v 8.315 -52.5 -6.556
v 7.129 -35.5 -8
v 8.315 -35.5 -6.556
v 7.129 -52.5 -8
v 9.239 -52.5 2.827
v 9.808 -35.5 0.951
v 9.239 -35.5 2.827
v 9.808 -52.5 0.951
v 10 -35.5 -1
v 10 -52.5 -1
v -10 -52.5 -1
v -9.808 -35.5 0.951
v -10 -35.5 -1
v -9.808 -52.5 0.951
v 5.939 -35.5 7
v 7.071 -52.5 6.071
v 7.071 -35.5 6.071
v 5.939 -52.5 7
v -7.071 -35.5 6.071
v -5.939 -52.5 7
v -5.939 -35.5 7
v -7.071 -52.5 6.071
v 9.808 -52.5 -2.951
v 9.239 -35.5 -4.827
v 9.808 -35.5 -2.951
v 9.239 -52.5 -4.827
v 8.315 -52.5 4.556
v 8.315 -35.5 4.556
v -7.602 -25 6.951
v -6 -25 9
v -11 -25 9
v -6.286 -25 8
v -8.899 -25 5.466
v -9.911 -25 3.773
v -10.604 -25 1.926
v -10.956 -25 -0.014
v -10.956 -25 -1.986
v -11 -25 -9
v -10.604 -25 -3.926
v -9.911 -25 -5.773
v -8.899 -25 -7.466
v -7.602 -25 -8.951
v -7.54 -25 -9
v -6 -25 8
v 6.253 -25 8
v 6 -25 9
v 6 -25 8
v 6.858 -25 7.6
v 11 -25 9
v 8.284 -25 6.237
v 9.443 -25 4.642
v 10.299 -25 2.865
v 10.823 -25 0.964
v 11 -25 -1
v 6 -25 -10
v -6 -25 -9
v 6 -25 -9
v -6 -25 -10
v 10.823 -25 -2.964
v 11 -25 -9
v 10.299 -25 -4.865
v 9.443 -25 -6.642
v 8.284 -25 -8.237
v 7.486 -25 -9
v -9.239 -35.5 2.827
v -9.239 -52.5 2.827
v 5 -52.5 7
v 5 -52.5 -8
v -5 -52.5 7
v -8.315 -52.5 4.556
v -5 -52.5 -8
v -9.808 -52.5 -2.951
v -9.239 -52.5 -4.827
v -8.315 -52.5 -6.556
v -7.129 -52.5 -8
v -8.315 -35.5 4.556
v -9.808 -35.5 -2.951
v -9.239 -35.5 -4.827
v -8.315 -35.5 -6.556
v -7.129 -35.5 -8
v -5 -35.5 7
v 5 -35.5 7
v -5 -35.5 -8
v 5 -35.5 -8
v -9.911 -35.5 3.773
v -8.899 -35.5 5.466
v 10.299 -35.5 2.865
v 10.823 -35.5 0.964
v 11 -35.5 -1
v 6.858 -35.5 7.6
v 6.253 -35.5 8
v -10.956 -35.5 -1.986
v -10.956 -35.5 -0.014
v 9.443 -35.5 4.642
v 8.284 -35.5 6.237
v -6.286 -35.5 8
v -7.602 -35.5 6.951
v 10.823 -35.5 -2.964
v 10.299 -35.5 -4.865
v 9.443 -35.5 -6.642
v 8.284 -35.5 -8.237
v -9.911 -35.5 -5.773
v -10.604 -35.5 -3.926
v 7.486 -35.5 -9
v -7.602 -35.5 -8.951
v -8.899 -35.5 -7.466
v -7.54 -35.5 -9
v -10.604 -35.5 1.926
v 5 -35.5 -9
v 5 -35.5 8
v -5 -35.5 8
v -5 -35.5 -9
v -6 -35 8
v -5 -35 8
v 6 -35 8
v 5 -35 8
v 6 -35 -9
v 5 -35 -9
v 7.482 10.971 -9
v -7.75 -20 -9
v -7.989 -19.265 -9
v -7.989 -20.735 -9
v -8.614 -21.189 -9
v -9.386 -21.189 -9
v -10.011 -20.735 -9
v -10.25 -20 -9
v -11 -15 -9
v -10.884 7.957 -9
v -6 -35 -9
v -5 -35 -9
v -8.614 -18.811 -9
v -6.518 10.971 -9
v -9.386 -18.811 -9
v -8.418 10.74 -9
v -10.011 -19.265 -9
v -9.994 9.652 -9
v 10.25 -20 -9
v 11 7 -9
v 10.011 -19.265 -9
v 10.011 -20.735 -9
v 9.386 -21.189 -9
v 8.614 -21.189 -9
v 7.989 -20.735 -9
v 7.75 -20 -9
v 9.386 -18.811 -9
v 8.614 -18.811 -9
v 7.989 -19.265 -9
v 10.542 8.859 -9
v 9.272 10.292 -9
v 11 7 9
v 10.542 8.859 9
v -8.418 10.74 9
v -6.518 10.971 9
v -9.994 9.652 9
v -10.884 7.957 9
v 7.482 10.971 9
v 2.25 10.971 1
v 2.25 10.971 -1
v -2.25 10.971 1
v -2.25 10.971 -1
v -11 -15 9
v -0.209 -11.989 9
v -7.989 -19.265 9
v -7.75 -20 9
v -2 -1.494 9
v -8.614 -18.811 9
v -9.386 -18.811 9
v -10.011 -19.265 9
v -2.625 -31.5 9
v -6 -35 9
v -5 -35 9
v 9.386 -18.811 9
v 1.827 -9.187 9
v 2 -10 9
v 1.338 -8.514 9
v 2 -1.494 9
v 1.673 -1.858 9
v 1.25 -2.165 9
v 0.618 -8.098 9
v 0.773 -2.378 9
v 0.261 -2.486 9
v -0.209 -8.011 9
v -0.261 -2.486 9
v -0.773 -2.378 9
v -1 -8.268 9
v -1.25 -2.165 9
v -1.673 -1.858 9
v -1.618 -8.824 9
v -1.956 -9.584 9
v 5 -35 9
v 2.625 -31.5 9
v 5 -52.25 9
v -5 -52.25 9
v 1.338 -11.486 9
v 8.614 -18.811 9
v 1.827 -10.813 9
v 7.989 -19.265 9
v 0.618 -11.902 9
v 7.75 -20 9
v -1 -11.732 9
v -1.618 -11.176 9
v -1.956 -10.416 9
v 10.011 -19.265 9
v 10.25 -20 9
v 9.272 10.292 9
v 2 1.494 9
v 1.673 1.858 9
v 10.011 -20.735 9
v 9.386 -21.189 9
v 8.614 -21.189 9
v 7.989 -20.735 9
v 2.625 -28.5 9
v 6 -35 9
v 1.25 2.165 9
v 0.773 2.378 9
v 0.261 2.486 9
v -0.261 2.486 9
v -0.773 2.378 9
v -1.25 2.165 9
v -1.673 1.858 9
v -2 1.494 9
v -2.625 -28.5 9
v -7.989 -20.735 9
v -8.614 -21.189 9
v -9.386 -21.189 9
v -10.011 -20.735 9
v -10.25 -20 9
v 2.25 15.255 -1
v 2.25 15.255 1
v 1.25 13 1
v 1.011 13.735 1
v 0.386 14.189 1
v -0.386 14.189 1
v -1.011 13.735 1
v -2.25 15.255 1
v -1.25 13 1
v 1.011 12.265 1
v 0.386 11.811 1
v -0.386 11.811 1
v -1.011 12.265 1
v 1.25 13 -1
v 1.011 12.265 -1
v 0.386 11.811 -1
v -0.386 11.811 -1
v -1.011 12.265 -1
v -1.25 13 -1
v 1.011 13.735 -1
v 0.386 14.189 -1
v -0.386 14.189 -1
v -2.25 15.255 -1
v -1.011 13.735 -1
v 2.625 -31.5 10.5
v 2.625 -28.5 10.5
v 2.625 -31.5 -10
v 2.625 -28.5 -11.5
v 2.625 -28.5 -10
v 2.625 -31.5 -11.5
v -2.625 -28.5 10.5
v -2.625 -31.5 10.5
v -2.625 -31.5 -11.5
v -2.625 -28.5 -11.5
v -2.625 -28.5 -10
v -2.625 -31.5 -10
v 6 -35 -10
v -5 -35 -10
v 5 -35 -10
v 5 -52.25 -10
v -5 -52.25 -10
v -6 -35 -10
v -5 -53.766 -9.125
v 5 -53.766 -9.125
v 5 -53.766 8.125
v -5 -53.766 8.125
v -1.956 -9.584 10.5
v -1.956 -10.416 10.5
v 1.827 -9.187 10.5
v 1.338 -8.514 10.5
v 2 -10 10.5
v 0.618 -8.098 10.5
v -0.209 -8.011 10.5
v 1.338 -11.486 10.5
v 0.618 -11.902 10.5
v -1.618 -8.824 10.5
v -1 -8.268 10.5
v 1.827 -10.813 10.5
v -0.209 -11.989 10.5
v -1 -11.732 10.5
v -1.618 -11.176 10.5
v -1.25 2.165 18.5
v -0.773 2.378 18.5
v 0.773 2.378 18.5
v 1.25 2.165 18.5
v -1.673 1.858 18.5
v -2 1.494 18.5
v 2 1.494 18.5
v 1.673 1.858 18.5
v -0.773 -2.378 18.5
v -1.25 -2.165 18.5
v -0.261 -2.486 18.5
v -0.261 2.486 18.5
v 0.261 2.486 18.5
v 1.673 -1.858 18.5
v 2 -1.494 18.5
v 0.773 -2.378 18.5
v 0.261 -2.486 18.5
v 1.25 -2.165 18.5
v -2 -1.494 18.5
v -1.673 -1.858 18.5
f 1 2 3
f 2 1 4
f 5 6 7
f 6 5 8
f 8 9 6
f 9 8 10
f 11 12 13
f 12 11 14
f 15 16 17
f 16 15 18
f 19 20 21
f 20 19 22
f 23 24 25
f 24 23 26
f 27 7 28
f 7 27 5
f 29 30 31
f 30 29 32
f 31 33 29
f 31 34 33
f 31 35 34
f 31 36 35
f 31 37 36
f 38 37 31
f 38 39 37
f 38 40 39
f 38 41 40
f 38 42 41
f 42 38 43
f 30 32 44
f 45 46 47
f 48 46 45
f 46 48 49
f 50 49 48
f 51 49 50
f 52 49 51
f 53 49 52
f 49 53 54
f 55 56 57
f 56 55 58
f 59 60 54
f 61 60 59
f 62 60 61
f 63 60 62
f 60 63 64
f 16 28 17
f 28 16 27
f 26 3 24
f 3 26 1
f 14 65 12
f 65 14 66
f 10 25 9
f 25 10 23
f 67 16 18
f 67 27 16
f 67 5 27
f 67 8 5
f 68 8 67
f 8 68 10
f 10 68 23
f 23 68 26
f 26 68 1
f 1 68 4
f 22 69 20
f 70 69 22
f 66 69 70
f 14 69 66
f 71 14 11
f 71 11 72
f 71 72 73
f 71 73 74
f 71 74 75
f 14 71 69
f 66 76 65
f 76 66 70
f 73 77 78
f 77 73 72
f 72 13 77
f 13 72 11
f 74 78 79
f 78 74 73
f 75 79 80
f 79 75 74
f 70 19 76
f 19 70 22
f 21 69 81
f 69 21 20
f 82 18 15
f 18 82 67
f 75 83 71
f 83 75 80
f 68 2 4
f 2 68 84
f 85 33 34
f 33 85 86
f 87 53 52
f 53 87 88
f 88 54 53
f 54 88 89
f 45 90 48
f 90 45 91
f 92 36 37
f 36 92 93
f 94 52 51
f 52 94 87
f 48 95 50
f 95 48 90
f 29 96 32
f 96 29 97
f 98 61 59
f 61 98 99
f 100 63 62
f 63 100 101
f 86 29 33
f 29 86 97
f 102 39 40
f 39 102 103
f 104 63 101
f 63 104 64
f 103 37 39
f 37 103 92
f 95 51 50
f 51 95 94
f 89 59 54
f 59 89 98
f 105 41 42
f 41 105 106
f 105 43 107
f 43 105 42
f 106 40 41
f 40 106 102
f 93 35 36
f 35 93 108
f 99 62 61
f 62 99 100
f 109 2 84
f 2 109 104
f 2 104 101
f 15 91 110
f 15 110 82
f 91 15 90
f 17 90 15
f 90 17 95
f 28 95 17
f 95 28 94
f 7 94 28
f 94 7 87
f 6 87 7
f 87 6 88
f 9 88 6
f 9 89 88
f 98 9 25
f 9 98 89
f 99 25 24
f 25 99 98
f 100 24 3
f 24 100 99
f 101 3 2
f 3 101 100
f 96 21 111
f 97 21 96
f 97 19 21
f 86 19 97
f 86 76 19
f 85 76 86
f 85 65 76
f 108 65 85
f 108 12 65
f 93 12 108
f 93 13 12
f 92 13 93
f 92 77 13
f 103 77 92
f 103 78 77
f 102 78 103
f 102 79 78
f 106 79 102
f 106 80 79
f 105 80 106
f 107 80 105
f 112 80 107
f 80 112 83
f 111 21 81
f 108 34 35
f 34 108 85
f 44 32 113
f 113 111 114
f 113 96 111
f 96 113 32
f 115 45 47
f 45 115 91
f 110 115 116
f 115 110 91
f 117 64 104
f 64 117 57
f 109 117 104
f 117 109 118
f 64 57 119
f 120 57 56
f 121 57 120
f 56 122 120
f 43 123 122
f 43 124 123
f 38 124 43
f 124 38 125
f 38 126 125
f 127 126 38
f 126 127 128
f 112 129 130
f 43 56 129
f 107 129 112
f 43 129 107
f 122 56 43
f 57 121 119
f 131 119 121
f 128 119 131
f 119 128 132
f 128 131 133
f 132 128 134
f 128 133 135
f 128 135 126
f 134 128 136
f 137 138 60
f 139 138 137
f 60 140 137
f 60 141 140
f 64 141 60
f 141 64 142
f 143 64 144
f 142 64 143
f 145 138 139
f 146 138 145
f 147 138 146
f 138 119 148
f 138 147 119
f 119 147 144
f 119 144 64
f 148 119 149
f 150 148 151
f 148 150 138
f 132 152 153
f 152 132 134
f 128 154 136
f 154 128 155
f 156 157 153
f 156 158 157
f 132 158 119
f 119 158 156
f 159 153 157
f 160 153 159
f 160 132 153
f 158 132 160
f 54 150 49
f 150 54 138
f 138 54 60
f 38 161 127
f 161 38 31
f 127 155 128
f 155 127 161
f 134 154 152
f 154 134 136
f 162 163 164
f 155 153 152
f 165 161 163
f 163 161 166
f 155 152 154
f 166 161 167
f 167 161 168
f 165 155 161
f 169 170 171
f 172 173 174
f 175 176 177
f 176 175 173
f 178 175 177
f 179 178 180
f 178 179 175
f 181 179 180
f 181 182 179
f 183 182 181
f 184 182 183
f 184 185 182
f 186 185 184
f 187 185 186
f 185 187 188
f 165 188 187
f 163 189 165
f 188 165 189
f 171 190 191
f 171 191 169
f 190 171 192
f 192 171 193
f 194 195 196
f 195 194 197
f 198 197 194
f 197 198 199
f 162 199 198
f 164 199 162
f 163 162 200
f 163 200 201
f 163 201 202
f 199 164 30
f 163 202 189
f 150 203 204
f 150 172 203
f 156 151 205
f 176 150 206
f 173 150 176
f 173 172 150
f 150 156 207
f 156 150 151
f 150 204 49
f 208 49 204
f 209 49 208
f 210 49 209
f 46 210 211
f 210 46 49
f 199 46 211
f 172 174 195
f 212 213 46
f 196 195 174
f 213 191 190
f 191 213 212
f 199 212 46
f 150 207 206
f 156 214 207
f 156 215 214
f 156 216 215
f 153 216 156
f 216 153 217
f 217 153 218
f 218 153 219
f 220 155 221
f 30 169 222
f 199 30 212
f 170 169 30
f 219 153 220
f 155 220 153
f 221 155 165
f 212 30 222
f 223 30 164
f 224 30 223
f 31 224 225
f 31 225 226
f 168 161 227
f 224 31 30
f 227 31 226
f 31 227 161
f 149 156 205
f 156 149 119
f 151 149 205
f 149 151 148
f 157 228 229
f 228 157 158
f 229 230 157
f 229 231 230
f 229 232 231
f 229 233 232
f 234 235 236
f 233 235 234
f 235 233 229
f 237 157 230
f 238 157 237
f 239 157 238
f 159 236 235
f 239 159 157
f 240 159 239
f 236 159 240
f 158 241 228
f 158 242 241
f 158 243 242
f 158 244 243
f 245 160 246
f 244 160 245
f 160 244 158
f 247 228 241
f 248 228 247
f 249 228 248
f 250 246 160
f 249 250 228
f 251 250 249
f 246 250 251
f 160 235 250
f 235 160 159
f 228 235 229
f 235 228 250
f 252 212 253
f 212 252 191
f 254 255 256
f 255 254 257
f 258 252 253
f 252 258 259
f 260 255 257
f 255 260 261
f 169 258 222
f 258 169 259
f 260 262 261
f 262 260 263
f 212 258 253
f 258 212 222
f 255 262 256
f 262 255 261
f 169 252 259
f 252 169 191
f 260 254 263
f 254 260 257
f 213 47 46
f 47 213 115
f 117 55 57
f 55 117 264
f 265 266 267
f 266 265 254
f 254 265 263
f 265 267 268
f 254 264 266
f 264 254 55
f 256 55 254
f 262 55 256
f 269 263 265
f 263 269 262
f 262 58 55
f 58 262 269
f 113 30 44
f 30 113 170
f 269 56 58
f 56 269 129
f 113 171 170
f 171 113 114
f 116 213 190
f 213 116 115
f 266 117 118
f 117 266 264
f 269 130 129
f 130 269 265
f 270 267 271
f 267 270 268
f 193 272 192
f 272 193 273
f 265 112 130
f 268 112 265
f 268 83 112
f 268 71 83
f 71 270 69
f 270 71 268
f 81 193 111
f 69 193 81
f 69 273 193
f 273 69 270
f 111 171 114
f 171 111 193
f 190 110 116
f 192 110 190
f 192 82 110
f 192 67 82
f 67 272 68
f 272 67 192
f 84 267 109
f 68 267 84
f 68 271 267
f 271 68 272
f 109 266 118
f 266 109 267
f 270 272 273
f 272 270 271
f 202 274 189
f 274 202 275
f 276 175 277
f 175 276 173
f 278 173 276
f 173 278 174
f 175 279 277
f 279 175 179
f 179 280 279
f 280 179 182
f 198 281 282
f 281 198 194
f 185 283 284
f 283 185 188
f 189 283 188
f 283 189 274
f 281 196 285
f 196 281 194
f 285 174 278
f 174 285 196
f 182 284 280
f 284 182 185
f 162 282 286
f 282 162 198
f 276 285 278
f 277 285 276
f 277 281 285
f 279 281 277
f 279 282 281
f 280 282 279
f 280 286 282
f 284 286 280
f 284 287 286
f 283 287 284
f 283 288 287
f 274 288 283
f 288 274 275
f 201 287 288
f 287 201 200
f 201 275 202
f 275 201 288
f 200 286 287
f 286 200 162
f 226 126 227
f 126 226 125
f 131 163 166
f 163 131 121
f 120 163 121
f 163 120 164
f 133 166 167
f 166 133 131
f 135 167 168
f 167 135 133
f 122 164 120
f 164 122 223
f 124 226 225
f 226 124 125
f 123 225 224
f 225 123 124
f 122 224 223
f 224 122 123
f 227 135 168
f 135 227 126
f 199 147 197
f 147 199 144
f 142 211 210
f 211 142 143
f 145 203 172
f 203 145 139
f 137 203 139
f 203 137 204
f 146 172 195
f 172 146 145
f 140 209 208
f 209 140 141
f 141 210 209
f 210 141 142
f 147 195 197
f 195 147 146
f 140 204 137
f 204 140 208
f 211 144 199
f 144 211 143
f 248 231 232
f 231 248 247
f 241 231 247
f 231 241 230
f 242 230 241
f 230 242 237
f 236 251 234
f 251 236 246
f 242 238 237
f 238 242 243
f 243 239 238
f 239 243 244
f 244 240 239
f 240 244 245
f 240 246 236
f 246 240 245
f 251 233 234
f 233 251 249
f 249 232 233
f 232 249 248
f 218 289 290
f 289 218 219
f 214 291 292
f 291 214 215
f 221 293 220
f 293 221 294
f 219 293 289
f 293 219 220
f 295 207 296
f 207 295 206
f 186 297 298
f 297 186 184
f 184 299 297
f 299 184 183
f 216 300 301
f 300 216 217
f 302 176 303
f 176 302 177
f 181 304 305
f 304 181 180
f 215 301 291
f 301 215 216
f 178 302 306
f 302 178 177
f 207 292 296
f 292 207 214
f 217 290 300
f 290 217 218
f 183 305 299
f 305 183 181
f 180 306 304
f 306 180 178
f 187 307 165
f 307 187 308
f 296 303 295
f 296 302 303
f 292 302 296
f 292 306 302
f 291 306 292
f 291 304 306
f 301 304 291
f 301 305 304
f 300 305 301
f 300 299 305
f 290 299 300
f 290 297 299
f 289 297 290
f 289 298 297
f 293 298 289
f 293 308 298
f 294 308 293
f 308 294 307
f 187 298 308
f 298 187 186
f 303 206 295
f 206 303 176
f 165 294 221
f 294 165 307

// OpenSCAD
/**
 * The keyed motor shaft, for subtracting a matching hole in another
 * object (e.g., the center of a wheel or gear). This is  generated with
 * the same origin and orientation as `YellowGearMotor`.
 * 
 * @param h: Shaft height (length) from the center of the gear motor.
 */
module MotorShaft(h=18.5) {
    color("white")
        intersection() {
            cylinder(h,2.5,2.5, center=true, $fn=30);
            cube([4,6,h+1], center=true);
        }
}


/**
 * A cylinder, intended to be differenced from another object to fit the motor
 * shaft with enough room to turn. This is  generated with the same origin and
 * orientation as `YellowGearMotor`.
 * 
 * @param h: Hole depth (length) from the center of the gear motor.
 * @param r: Hole radius.
 * @param doubleSided: If `true` (and `shaft` is `true`), the shaft will protrude
 *     from both sides of the motor. This reflects the two models of gear motor.
 */
module ShaftHole(h=20, r=2.75, doubleSided=false) {
    if(doubleSided)
        cylinder(h*2, r, r, center=true);
    else
        cylinder(h, r, r);
}


/**
 * MountingHoles: cylinders representing the gear motor's mounting holes, for
 * subtracting matching holes in another model for attachment. These are 
 * generated with the same origin and orientation as `YellowGearMotor`.
 *
 * @param h: Height of the cylinders.
 * @param r: Radius of the cylinders.
 */
module MountingHoles(h=20, r=1.25) {
    translate([-9,-20,0]) cylinder(h,r,r, center=true, $fn=10);
    translate([9,-20,0]) cylinder(h,r,r, center=true, $fn=10);
    translate([0,13,0]) cylinder(h,r,r, center=true, $fn=10);
}

/**
 * A complete model of a common, cheap DC gear motor, typically in a yellow plastic
 * housing. 
 * 
 * @param pad: An amount of padding (in local units) to enlarge the gear motor
 *     model, intended for creating a slightly oversized cavity in another object
 *     for inserting a real gear motor into a printed object.
 * @param shaft: If `true`, generate the motor's keyed output shaft. Not recommended
 *     if differencing `YellowGearMotor` from another object.
 * @param doubleSided: If `true` (and `shaft` is `true`), the shaft will protrude
 *     from both sides of the motor. This reflects the two models of gear motor.
 * @param holes: If `true` (default), the gear motor's mounting holes will be
 *     generated in the model. Not recommended if differencing `YellowGearMotor`
 *     from another object.
 */
module YellowGearMotor(pad=0, shaft=true, doubleSided=false, holes=false) {
    // Main body
    color("yellow") {
        difference() {
            union() {
                // Gearbox
                hull() {
                    //$fn=30;
                    translate([0,-20,0]) cube([22+pad,10+pad,18+pad], center=true);
                    translate([-7,7,0]) cylinder(18+pad,4+(pad/2),4+(pad/2), center=true);
                    translate([7,7,0]) cylinder(18+pad,4+(pad/2),4+(pad/2), center=true);
                }
                
                // Top tab
                translate([0,13,0]) 
                    cube([4.5,4.51,2], center=true);
                
                // Motor (simplified)
                intersection() {
                    rotate([90,0,0]) translate([0,-1,25-pad]) cylinder(27.5+pad,10+pad,10+pad);
                    translate([0,-40,-.5]) cube([21+pad,37+pad,15+pad], center=true);
                }

                // Motor (simplified)
                intersection() {
                    rotate([90,0,0]) translate([0,-1,24-pad]) cylinder(11.5+pad,11+pad,11+pad);
                    translate([0,-40,-.5]) cube([22+pad,37+pad,17+pad], center=true);
                }

                
                // Strap hooks
                translate([0, -30, -.5]) cube([5.25+pad, 3+pad, 22+pad], center=true);
                
                // Strap
                translate([0, -30, -.5]) cube([12+pad, 10+pad, 19+pad], center=true);
                hull() {
                    translate([0, -40, -.5]) 
                        cube([10+pad, 20+pad, 19+pad], center=true);
                    translate([0, -52.25, -8.25]) 
                        rotate([0, 90, 0])
                            cylinder(10+pad, 1.75+pad/2, 1.75+pad/2, center=true);
                    translate([0, -52.25, 7.25]) 
                        rotate([0, 90, 0])
                            cylinder(10+pad, 1.75+pad/2, 1.75+pad/2, center=true);
                }
                
                // Key nub
                translate([0,-10,0])
                    cylinder(10.5+pad,2+pad,2+pad, $fn=15);
            }
            if (holes)
                MountingHoles(20+(2*pad));
        }
    }
    // Shaft
    if (shaft) {
        if (doubleSided) {
            //translate([0,10,0])
                MotorShaft(37);
        }
        else {
            translate([0,0,9.25])
                MotorShaft(18.5);
        }
    }
}

// Example (remove later)
$fa=1;
YellowGearMotor(shaft=false, holes=true, pad=0);
translate([0,0,9.25]) MotorShaft();
